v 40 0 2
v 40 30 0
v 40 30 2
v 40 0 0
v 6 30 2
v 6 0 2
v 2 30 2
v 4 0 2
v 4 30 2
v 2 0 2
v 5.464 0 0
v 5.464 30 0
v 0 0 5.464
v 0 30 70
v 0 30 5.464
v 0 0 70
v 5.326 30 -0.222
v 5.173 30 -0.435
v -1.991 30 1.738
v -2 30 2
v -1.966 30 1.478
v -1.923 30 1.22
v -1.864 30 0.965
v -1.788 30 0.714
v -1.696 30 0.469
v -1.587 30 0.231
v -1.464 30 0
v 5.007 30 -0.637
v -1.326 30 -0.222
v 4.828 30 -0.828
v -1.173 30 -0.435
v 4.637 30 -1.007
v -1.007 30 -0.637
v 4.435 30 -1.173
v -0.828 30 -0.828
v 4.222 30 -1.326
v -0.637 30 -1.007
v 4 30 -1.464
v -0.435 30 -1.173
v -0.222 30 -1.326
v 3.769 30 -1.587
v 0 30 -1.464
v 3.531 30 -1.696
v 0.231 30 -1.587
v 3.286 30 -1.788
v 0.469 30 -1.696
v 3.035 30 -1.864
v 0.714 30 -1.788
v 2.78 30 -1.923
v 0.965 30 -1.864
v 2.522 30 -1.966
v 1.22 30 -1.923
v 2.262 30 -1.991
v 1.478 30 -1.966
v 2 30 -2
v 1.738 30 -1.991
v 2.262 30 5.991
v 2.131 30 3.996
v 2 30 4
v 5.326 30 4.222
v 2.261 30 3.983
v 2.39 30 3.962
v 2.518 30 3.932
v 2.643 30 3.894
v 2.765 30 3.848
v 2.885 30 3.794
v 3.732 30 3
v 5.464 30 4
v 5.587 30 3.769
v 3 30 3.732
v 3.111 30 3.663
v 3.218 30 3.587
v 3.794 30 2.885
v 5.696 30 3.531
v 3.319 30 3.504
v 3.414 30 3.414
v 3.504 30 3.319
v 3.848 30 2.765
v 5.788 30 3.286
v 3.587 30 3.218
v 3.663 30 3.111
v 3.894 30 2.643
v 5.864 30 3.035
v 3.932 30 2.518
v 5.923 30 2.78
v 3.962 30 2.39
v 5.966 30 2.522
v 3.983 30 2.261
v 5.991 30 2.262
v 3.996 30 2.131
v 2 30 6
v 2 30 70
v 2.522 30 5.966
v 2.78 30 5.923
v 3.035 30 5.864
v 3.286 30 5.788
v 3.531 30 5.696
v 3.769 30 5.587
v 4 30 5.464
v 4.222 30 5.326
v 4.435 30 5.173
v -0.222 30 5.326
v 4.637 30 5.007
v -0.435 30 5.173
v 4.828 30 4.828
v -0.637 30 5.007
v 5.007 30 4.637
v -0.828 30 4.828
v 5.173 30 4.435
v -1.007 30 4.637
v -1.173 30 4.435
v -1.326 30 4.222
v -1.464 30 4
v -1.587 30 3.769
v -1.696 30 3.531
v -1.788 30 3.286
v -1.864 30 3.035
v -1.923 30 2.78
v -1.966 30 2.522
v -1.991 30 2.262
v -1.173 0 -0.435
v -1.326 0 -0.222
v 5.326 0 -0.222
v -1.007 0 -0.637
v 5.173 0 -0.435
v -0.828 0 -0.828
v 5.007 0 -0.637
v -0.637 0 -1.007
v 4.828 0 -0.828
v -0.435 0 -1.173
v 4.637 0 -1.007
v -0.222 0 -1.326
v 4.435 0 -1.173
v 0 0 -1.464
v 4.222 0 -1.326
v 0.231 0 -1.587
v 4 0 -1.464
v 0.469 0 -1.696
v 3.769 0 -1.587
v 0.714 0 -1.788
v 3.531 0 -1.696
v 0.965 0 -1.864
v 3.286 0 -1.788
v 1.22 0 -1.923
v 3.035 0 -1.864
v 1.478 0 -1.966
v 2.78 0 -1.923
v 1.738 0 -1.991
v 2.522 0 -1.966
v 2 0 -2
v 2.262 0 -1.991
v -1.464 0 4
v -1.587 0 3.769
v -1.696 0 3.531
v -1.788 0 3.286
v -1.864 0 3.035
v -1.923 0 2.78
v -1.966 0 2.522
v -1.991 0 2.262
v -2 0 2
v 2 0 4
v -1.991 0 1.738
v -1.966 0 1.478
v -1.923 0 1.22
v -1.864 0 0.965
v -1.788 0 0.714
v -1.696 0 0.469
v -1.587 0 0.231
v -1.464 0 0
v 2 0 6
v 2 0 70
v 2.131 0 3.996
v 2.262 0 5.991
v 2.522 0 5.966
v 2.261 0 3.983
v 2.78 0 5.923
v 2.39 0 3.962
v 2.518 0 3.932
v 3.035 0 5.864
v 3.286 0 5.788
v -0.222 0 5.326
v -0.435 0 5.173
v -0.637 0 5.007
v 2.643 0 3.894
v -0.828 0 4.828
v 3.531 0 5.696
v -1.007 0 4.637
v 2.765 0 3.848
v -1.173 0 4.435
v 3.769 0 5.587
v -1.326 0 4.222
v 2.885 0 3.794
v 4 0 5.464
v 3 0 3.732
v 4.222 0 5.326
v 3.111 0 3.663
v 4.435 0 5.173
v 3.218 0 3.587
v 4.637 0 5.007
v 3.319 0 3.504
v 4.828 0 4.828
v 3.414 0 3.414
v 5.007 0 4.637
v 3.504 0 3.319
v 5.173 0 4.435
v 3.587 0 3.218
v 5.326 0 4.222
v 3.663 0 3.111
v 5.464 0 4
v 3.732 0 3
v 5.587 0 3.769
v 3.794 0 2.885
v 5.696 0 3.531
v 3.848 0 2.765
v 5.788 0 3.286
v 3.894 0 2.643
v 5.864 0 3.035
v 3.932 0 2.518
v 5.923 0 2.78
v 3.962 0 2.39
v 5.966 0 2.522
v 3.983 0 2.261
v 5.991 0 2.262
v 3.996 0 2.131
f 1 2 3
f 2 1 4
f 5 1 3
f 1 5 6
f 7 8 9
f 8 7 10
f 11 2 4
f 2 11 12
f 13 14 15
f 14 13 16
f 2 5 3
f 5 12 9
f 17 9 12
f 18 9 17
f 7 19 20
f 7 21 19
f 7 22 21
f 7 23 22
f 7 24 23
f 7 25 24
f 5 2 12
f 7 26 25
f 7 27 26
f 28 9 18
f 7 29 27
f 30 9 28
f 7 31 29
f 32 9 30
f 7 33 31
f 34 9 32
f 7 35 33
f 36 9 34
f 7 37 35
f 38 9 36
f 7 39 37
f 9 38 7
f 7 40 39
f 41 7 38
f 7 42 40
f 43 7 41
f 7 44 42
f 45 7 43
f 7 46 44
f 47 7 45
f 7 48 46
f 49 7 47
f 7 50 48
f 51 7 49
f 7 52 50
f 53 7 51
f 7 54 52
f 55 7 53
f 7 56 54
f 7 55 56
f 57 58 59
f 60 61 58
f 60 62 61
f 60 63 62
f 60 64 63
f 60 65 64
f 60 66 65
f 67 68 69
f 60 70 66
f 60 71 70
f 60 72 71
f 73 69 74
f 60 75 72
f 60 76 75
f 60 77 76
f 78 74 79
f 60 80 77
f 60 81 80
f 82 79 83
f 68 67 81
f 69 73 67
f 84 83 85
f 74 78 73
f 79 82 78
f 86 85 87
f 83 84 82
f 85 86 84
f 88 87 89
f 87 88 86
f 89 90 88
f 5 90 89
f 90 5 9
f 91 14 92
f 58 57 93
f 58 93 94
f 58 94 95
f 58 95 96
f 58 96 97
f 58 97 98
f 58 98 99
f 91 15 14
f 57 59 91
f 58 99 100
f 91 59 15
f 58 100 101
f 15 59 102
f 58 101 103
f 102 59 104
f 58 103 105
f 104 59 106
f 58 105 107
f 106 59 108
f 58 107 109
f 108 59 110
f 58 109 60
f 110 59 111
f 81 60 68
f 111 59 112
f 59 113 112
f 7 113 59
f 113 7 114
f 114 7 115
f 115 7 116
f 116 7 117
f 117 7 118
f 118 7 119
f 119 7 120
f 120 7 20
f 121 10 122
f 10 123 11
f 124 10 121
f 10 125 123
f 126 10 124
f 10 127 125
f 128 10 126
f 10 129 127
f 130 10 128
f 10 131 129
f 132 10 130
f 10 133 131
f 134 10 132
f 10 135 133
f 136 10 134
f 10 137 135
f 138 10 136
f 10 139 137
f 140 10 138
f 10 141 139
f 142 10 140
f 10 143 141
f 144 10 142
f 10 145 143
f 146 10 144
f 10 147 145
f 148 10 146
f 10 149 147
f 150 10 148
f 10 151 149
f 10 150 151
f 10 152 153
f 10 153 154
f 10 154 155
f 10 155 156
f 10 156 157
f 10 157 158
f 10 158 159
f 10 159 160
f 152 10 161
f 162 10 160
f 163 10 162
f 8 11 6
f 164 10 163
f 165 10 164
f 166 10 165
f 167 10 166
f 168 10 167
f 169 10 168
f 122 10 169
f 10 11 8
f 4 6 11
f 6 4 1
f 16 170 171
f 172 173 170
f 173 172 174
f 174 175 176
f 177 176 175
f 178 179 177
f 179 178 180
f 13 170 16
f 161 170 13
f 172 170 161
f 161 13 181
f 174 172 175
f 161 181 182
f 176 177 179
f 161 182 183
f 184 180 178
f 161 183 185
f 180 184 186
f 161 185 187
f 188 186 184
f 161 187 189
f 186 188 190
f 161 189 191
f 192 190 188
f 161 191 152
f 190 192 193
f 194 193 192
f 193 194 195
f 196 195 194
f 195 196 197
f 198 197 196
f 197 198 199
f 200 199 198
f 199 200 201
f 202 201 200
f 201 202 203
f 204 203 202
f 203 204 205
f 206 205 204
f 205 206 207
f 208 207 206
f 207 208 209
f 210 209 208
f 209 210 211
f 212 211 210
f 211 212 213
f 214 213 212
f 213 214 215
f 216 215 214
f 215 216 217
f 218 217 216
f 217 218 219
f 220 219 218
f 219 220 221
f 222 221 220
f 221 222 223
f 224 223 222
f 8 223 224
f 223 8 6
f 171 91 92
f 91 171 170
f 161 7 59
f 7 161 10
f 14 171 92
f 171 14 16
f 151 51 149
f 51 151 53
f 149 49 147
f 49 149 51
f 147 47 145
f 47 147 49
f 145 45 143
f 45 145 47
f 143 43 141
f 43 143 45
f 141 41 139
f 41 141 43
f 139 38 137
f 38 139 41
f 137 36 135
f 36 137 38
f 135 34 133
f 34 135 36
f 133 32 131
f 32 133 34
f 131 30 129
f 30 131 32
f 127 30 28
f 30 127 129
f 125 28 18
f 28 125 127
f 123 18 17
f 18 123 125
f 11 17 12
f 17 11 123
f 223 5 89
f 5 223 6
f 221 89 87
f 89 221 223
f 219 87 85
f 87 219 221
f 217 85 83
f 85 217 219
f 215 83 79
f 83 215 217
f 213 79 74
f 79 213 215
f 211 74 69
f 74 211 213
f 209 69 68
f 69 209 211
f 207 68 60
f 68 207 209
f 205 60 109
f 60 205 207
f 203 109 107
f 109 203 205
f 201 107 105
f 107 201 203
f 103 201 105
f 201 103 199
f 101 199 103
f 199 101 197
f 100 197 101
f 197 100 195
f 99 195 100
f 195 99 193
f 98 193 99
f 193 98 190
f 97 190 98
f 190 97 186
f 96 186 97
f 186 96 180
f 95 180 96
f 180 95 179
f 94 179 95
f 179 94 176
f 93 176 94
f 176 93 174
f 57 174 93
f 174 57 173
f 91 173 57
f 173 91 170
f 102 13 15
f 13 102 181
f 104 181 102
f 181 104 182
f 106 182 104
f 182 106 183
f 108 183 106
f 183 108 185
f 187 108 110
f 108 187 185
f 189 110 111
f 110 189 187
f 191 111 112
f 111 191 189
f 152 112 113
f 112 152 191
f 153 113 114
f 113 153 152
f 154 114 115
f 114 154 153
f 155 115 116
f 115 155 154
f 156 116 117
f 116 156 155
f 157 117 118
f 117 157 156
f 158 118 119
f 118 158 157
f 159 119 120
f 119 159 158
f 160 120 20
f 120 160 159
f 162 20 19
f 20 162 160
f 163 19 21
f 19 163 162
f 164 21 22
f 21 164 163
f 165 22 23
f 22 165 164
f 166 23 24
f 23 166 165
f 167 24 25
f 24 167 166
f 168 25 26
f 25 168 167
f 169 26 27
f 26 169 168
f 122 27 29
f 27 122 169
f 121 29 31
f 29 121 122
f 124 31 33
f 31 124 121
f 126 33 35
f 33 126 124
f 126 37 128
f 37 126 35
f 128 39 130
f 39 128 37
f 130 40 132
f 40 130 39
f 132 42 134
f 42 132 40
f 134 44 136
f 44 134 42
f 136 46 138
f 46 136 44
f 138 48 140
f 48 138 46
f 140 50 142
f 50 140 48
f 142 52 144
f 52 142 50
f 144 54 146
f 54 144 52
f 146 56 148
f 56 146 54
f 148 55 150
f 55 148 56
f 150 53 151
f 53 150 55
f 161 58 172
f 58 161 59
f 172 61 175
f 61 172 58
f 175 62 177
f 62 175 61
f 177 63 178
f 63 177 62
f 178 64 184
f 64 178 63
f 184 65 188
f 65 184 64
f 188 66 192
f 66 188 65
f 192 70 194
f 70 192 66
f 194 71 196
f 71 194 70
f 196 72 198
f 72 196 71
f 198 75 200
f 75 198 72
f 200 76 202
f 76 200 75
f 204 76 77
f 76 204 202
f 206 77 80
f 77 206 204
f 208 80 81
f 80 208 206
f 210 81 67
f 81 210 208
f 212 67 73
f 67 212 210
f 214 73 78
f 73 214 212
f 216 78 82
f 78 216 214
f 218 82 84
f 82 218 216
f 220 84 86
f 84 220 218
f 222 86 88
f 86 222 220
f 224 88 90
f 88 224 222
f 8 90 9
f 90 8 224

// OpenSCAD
$fn = 96;

thickness_mm = 2.0;
bend_radius_mm = 2.0;
k_factor = 0.45;

flange_a_mm = 70.0;
flange_b_mm = 40.0;
width_mm = 30.0;

neutral_axis_radius_mm = bend_radius_mm + k_factor * thickness_mm;
bend_allowance_mm = PI / 2 * neutral_axis_radius_mm;
bend_deduction_mm = 2 * (bend_radius_mm + thickness_mm) - bend_allowance_mm;
developed_flat_length_mm = flange_a_mm + flange_b_mm - bend_deduction_mm;

echo(str(
    "MAKERBENCH-SHEETMETAL: {",
    "\"thickness_mm\": ", thickness_mm, ", ",
    "\"bend_radius_mm\": ", bend_radius_mm, ", ",
    "\"developed_flat_length_mm\": ", developed_flat_length_mm,
    "}"
));

module formed_bracket() {
    union() {
        // Horizontal flange
        cube([flange_b_mm, width_mm, thickness_mm], center = false);

        // Vertical flange
        cube([thickness_mm, width_mm, flange_a_mm], center = false);

        // Bend region preview: constant-thickness quarter annulus
        translate([bend_radius_mm, width_mm / 2, bend_radius_mm])
            rotate([90, 0, 0])
                linear_extrude(height = width_mm, center = true, convexity = 10)
                    difference() {
                        circle(r = bend_radius_mm + thickness_mm);
                        circle(r = bend_radius_mm);
                    }
    }
}

formed_bracket();
